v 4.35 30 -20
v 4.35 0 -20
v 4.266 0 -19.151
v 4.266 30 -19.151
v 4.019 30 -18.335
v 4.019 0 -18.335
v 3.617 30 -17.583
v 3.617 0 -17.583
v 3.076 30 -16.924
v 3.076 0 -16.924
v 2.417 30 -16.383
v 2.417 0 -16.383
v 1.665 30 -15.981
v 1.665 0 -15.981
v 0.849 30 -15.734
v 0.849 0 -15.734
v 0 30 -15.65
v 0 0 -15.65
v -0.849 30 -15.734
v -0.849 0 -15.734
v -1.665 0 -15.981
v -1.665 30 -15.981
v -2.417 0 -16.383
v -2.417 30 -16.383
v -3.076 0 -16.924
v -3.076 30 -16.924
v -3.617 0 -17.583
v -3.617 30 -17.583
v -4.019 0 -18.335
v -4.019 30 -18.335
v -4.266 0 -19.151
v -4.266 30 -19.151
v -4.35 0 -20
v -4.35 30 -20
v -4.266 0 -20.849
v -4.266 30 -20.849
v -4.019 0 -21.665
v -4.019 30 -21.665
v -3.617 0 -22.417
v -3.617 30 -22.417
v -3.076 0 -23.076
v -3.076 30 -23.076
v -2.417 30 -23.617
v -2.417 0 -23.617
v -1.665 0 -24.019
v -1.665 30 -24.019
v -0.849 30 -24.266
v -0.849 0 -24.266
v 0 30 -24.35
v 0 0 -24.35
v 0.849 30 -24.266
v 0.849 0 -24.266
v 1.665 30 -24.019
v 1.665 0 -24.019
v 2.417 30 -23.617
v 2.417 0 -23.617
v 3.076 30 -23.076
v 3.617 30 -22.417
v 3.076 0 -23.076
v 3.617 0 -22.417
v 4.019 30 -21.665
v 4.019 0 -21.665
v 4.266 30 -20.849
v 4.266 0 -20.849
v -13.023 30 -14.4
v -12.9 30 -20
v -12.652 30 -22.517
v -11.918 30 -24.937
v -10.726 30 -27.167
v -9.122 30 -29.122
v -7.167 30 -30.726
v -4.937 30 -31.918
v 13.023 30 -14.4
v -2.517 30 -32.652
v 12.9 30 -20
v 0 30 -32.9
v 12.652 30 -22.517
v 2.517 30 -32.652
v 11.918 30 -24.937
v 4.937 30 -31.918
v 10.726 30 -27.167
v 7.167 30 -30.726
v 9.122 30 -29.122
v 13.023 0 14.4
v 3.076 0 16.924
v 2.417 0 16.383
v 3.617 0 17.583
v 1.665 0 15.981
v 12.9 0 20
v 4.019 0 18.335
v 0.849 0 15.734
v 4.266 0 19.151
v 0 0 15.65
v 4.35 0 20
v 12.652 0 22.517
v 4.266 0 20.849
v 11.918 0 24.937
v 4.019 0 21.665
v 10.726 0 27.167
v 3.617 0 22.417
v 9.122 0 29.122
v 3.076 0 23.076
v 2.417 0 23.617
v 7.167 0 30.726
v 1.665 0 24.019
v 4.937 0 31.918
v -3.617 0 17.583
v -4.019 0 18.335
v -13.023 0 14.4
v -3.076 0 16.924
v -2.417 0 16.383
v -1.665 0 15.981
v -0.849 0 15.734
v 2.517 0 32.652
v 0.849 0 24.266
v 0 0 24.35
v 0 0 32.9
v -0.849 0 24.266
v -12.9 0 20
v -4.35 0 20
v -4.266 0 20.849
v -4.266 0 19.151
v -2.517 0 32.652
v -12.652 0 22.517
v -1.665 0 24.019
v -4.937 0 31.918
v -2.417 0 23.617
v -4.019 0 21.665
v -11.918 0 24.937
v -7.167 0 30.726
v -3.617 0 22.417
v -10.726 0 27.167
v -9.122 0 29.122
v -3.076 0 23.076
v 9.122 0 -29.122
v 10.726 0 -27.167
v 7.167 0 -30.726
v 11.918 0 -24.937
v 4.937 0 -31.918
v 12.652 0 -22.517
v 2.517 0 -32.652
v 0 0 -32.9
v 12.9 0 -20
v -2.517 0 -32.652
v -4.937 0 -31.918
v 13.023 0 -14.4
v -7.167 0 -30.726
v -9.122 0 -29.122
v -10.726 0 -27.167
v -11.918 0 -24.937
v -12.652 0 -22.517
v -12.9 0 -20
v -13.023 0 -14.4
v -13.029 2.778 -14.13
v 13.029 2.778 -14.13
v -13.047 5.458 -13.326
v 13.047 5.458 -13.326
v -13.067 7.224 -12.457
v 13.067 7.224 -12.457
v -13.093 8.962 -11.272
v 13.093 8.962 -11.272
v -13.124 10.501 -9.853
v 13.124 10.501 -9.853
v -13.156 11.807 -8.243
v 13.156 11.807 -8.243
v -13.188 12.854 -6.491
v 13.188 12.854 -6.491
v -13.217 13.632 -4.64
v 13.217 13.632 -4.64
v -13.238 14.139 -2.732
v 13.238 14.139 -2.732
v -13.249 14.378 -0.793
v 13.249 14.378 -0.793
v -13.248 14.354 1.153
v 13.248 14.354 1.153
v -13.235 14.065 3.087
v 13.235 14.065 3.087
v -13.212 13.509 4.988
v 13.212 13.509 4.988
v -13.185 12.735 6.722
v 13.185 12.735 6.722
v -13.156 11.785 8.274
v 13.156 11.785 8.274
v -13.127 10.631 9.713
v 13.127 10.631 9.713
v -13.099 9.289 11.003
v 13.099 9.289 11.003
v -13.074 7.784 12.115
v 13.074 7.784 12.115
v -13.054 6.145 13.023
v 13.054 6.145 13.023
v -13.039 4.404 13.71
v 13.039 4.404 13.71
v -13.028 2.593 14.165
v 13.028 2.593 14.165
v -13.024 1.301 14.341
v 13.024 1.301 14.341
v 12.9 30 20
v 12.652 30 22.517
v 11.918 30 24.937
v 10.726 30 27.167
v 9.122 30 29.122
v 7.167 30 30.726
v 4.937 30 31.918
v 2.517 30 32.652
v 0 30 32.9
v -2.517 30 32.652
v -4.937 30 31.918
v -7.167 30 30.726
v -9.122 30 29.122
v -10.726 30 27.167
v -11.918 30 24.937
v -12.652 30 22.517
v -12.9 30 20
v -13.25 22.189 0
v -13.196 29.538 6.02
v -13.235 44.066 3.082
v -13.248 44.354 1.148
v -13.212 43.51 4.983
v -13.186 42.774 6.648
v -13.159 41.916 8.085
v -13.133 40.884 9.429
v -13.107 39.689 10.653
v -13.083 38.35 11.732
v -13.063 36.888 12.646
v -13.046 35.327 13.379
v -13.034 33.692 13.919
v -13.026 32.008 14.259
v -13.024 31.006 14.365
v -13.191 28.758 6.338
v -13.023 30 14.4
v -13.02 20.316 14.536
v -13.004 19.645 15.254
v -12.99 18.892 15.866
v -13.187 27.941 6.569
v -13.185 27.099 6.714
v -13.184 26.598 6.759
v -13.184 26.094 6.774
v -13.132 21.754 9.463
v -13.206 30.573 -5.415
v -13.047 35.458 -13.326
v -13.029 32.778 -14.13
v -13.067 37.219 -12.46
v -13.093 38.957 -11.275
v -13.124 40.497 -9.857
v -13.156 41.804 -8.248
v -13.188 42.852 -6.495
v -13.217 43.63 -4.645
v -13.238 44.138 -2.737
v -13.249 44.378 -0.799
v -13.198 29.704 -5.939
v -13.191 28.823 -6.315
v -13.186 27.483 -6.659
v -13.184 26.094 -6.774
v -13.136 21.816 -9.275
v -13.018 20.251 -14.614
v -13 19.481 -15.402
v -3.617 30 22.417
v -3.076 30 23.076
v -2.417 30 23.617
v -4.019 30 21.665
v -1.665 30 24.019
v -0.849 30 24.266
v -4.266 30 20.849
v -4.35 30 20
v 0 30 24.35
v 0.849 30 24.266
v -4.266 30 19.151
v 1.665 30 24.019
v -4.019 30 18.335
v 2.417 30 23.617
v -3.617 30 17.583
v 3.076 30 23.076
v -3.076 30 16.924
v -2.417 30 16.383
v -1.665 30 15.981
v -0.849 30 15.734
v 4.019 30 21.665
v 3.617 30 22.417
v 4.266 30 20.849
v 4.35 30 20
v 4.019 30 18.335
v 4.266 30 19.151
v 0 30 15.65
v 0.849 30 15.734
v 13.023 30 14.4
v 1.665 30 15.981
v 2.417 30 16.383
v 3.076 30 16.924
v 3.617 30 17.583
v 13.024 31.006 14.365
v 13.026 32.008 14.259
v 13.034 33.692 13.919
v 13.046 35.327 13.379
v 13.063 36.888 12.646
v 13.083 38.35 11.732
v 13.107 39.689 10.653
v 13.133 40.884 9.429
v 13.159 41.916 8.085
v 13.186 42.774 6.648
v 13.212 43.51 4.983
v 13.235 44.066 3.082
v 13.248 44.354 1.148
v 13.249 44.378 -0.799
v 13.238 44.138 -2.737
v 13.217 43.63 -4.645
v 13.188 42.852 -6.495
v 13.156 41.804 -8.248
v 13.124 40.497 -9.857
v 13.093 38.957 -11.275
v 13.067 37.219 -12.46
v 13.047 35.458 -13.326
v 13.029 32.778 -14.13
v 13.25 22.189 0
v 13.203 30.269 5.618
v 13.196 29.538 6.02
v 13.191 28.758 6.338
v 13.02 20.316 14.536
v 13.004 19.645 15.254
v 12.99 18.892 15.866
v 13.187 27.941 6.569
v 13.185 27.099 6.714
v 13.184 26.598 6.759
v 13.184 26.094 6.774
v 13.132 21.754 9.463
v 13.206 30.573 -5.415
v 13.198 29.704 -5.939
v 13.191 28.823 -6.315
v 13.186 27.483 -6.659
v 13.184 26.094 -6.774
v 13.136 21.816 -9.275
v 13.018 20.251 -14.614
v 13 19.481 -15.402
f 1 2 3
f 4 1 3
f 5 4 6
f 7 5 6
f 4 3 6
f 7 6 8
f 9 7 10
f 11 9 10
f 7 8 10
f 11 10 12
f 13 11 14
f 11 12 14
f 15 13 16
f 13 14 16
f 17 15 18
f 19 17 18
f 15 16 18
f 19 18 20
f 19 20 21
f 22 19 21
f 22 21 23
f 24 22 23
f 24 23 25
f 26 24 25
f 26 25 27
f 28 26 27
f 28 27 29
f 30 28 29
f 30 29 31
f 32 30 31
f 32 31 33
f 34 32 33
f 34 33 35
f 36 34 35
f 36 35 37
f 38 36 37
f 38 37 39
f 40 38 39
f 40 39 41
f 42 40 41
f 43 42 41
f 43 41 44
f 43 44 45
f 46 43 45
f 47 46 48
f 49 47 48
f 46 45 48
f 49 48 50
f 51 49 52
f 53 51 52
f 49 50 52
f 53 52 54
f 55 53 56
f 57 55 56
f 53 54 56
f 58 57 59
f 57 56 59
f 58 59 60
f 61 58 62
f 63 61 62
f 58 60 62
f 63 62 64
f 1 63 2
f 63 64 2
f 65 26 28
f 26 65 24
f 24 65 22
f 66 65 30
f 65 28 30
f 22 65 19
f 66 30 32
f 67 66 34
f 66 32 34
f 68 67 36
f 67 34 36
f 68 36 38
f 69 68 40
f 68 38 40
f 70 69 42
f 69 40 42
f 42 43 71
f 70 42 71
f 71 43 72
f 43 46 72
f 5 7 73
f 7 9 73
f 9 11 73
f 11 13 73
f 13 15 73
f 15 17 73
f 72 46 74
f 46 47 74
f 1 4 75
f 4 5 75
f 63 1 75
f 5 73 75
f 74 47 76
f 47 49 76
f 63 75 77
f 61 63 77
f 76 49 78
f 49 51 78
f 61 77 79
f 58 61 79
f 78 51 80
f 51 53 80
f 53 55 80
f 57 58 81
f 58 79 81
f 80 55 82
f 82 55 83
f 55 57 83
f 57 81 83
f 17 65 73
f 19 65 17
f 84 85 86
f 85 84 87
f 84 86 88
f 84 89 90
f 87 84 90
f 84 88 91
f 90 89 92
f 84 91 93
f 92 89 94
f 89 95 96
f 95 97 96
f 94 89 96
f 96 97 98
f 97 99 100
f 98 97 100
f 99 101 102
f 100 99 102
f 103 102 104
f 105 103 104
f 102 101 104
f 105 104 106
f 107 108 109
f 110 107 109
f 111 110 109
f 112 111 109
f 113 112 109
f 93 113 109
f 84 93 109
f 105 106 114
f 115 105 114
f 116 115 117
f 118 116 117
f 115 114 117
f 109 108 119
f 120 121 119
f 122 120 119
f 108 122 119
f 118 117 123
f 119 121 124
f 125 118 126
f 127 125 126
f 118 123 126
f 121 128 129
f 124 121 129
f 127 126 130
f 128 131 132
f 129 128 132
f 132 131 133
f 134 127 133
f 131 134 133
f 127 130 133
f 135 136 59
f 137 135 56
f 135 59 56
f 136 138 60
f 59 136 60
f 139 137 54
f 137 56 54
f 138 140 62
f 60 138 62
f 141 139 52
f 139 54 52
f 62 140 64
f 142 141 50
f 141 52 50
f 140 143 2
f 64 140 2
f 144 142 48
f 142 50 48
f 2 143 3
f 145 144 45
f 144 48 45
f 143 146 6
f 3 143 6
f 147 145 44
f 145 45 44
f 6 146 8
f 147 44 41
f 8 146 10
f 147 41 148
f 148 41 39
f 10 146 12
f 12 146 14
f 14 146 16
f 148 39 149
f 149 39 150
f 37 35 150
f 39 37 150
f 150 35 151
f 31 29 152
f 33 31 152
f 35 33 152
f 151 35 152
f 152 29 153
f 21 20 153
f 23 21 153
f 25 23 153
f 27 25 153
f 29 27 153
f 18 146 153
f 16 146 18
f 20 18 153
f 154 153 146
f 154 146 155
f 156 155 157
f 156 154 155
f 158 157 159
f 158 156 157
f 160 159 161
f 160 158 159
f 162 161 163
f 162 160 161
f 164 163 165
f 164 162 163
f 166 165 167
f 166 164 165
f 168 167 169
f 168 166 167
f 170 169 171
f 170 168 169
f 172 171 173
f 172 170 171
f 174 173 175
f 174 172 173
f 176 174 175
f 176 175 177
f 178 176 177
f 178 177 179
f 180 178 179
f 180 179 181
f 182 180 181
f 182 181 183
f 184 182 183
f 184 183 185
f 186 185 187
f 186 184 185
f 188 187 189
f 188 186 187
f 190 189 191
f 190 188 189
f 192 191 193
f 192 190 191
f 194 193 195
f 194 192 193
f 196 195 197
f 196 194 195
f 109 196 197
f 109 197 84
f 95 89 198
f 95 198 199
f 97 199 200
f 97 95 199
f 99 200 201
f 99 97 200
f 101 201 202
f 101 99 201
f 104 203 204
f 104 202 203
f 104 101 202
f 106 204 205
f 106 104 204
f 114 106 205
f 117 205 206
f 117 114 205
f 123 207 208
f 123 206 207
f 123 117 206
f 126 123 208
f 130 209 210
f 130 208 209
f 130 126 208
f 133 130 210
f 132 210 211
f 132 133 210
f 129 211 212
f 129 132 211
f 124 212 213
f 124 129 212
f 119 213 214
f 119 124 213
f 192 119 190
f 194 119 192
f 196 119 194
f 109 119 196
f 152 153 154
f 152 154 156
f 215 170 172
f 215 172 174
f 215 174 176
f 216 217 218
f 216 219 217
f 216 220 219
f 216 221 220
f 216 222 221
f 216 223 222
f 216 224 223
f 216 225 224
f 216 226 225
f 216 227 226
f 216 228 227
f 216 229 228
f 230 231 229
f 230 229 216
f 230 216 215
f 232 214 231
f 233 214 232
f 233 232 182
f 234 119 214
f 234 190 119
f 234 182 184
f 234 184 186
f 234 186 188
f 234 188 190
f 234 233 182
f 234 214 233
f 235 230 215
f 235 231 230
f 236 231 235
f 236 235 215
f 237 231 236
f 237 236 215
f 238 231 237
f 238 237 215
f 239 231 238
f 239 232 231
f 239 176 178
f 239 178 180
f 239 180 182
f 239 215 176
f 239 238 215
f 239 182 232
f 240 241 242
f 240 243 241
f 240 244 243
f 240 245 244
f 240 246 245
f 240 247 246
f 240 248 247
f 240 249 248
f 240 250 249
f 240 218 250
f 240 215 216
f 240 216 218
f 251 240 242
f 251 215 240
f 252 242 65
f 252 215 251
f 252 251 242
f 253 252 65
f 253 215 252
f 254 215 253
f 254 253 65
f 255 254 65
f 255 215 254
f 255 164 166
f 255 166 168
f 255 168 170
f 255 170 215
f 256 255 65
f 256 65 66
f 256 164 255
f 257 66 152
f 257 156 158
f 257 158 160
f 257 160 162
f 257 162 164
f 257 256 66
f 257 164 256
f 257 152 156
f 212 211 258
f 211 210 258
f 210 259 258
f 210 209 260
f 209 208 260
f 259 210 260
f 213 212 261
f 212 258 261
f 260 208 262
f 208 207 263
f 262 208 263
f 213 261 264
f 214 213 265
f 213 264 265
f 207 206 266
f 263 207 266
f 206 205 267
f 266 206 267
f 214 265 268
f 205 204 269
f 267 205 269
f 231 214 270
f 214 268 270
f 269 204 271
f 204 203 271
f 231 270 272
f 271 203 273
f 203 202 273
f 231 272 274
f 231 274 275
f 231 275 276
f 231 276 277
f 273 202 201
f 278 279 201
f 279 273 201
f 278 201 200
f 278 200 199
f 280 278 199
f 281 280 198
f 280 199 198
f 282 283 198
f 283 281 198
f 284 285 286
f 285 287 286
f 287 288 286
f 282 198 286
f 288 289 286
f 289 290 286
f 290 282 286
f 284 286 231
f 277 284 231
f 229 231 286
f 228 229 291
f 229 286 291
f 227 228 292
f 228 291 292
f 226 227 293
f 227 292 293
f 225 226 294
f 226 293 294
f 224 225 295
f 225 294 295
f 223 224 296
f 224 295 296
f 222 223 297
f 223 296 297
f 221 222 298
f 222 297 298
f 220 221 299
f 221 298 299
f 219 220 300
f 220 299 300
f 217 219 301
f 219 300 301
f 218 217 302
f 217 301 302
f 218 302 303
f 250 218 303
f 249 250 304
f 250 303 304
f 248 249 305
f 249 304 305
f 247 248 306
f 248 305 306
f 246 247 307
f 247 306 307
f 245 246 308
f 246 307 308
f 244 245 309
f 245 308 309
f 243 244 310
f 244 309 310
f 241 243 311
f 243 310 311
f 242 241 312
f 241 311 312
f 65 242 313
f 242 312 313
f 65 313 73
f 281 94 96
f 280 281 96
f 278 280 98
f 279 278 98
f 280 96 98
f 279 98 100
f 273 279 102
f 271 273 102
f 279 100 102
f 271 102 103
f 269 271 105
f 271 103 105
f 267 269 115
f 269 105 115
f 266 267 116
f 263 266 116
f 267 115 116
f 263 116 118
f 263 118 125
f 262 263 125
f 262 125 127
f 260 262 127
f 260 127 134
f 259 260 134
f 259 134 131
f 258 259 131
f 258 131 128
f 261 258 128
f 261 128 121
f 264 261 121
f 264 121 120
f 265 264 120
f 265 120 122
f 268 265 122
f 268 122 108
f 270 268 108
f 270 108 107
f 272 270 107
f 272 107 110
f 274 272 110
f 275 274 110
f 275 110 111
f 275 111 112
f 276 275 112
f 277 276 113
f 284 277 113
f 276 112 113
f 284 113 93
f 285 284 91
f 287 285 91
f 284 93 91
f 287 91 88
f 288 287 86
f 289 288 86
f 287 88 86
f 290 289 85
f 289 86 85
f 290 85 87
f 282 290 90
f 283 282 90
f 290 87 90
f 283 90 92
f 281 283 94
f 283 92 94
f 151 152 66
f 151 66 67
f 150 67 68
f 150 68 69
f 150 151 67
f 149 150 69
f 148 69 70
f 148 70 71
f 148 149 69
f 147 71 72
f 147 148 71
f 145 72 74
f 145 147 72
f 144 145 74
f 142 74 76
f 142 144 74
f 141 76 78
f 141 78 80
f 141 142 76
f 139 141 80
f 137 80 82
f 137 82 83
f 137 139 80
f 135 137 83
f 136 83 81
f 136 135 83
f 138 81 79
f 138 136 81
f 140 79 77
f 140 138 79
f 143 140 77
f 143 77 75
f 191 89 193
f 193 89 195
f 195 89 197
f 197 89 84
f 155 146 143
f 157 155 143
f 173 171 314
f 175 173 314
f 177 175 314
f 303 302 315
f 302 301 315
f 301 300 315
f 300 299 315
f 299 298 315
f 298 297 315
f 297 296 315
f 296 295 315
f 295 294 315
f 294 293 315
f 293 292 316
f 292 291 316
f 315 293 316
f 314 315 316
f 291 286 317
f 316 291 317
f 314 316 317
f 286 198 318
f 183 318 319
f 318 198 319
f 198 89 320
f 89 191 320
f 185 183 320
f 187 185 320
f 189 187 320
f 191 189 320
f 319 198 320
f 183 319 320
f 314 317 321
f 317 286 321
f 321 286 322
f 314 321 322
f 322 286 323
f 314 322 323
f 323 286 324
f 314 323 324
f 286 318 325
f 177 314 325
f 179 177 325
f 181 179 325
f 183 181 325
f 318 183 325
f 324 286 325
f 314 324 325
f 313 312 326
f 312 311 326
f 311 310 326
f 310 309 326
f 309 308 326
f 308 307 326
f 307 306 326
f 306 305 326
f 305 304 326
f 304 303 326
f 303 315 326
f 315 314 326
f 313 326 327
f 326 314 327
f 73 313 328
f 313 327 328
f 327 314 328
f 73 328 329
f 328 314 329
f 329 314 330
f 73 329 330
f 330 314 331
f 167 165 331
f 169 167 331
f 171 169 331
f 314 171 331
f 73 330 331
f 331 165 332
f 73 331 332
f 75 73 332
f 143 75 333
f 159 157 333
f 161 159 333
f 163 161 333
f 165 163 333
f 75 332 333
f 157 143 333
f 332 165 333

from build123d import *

# Parameters (mm, degrees)
F0_R     = 4.35
F1_DEPTH = 50
F3_DEPTH = 15


with BuildPart() as f1:
    # F0 (on Front) → F1 (new body)
    with BuildSketch(Plane.XZ):
        with BuildLine():
            add(Edge.make_bspline(
                [(12.9, 20), (13.075, 11.616667), (13.425, 0), (13.075, -11.616667), (12.9, -20)],
                knots=[0, 0, 0, 0, 20.003062, 40.006125, 40.006125, 40.006125, 40.006125], degree=3))
            ThreePointArc((12.9, 20), (0, 32.9), (-12.9, 20))
            add(Edge.make_bspline(
                [(-12.9, 20), (-13.075, 11.616667), (-13.425, 0), (-13.075, -11.616667), (-12.9, -20)],
                knots=[0, 0, 0, 0, 20.003062, 40.006125, 40.006125, 40.006125, 40.006125], degree=3))
            ThreePointArc((-12.9, -20), (0, -32.9), (12.9, -20))
        make_face()
        with Locations((0, -20)):
            Circle(F0_R, mode=Mode.SUBTRACT)
        with Locations((0, 20)):
            Circle(F0_R, mode=Mode.SUBTRACT)
    extrude(amount=-F1_DEPTH)

    # F2 (on Right) → F3 (cut, symmetric)
    with BuildSketch(Plane.YZ):
        with BuildLine():
            Line((0, 14.4), (0, -14.4))
            ThreePointArc((0, -14.4), (14.4, 0), (0, 14.4))
        make_face()
        with BuildLine():
            Line((50, -32.9), (50, 32.9))
            Line((50, 32.9), (30, 32.9))
            Line((30, 32.9), (30, 14.4))
            ThreePointArc((30, 14.4), (44.4, 0), (30, -14.4))
            Line((30, -14.4), (30, -32.9))
            Line((30, -32.9), (50, -32.9))
        make_face()
    extrude(amount=F3_DEPTH, both=True, mode=Mode.SUBTRACT)


solid = f1.part
